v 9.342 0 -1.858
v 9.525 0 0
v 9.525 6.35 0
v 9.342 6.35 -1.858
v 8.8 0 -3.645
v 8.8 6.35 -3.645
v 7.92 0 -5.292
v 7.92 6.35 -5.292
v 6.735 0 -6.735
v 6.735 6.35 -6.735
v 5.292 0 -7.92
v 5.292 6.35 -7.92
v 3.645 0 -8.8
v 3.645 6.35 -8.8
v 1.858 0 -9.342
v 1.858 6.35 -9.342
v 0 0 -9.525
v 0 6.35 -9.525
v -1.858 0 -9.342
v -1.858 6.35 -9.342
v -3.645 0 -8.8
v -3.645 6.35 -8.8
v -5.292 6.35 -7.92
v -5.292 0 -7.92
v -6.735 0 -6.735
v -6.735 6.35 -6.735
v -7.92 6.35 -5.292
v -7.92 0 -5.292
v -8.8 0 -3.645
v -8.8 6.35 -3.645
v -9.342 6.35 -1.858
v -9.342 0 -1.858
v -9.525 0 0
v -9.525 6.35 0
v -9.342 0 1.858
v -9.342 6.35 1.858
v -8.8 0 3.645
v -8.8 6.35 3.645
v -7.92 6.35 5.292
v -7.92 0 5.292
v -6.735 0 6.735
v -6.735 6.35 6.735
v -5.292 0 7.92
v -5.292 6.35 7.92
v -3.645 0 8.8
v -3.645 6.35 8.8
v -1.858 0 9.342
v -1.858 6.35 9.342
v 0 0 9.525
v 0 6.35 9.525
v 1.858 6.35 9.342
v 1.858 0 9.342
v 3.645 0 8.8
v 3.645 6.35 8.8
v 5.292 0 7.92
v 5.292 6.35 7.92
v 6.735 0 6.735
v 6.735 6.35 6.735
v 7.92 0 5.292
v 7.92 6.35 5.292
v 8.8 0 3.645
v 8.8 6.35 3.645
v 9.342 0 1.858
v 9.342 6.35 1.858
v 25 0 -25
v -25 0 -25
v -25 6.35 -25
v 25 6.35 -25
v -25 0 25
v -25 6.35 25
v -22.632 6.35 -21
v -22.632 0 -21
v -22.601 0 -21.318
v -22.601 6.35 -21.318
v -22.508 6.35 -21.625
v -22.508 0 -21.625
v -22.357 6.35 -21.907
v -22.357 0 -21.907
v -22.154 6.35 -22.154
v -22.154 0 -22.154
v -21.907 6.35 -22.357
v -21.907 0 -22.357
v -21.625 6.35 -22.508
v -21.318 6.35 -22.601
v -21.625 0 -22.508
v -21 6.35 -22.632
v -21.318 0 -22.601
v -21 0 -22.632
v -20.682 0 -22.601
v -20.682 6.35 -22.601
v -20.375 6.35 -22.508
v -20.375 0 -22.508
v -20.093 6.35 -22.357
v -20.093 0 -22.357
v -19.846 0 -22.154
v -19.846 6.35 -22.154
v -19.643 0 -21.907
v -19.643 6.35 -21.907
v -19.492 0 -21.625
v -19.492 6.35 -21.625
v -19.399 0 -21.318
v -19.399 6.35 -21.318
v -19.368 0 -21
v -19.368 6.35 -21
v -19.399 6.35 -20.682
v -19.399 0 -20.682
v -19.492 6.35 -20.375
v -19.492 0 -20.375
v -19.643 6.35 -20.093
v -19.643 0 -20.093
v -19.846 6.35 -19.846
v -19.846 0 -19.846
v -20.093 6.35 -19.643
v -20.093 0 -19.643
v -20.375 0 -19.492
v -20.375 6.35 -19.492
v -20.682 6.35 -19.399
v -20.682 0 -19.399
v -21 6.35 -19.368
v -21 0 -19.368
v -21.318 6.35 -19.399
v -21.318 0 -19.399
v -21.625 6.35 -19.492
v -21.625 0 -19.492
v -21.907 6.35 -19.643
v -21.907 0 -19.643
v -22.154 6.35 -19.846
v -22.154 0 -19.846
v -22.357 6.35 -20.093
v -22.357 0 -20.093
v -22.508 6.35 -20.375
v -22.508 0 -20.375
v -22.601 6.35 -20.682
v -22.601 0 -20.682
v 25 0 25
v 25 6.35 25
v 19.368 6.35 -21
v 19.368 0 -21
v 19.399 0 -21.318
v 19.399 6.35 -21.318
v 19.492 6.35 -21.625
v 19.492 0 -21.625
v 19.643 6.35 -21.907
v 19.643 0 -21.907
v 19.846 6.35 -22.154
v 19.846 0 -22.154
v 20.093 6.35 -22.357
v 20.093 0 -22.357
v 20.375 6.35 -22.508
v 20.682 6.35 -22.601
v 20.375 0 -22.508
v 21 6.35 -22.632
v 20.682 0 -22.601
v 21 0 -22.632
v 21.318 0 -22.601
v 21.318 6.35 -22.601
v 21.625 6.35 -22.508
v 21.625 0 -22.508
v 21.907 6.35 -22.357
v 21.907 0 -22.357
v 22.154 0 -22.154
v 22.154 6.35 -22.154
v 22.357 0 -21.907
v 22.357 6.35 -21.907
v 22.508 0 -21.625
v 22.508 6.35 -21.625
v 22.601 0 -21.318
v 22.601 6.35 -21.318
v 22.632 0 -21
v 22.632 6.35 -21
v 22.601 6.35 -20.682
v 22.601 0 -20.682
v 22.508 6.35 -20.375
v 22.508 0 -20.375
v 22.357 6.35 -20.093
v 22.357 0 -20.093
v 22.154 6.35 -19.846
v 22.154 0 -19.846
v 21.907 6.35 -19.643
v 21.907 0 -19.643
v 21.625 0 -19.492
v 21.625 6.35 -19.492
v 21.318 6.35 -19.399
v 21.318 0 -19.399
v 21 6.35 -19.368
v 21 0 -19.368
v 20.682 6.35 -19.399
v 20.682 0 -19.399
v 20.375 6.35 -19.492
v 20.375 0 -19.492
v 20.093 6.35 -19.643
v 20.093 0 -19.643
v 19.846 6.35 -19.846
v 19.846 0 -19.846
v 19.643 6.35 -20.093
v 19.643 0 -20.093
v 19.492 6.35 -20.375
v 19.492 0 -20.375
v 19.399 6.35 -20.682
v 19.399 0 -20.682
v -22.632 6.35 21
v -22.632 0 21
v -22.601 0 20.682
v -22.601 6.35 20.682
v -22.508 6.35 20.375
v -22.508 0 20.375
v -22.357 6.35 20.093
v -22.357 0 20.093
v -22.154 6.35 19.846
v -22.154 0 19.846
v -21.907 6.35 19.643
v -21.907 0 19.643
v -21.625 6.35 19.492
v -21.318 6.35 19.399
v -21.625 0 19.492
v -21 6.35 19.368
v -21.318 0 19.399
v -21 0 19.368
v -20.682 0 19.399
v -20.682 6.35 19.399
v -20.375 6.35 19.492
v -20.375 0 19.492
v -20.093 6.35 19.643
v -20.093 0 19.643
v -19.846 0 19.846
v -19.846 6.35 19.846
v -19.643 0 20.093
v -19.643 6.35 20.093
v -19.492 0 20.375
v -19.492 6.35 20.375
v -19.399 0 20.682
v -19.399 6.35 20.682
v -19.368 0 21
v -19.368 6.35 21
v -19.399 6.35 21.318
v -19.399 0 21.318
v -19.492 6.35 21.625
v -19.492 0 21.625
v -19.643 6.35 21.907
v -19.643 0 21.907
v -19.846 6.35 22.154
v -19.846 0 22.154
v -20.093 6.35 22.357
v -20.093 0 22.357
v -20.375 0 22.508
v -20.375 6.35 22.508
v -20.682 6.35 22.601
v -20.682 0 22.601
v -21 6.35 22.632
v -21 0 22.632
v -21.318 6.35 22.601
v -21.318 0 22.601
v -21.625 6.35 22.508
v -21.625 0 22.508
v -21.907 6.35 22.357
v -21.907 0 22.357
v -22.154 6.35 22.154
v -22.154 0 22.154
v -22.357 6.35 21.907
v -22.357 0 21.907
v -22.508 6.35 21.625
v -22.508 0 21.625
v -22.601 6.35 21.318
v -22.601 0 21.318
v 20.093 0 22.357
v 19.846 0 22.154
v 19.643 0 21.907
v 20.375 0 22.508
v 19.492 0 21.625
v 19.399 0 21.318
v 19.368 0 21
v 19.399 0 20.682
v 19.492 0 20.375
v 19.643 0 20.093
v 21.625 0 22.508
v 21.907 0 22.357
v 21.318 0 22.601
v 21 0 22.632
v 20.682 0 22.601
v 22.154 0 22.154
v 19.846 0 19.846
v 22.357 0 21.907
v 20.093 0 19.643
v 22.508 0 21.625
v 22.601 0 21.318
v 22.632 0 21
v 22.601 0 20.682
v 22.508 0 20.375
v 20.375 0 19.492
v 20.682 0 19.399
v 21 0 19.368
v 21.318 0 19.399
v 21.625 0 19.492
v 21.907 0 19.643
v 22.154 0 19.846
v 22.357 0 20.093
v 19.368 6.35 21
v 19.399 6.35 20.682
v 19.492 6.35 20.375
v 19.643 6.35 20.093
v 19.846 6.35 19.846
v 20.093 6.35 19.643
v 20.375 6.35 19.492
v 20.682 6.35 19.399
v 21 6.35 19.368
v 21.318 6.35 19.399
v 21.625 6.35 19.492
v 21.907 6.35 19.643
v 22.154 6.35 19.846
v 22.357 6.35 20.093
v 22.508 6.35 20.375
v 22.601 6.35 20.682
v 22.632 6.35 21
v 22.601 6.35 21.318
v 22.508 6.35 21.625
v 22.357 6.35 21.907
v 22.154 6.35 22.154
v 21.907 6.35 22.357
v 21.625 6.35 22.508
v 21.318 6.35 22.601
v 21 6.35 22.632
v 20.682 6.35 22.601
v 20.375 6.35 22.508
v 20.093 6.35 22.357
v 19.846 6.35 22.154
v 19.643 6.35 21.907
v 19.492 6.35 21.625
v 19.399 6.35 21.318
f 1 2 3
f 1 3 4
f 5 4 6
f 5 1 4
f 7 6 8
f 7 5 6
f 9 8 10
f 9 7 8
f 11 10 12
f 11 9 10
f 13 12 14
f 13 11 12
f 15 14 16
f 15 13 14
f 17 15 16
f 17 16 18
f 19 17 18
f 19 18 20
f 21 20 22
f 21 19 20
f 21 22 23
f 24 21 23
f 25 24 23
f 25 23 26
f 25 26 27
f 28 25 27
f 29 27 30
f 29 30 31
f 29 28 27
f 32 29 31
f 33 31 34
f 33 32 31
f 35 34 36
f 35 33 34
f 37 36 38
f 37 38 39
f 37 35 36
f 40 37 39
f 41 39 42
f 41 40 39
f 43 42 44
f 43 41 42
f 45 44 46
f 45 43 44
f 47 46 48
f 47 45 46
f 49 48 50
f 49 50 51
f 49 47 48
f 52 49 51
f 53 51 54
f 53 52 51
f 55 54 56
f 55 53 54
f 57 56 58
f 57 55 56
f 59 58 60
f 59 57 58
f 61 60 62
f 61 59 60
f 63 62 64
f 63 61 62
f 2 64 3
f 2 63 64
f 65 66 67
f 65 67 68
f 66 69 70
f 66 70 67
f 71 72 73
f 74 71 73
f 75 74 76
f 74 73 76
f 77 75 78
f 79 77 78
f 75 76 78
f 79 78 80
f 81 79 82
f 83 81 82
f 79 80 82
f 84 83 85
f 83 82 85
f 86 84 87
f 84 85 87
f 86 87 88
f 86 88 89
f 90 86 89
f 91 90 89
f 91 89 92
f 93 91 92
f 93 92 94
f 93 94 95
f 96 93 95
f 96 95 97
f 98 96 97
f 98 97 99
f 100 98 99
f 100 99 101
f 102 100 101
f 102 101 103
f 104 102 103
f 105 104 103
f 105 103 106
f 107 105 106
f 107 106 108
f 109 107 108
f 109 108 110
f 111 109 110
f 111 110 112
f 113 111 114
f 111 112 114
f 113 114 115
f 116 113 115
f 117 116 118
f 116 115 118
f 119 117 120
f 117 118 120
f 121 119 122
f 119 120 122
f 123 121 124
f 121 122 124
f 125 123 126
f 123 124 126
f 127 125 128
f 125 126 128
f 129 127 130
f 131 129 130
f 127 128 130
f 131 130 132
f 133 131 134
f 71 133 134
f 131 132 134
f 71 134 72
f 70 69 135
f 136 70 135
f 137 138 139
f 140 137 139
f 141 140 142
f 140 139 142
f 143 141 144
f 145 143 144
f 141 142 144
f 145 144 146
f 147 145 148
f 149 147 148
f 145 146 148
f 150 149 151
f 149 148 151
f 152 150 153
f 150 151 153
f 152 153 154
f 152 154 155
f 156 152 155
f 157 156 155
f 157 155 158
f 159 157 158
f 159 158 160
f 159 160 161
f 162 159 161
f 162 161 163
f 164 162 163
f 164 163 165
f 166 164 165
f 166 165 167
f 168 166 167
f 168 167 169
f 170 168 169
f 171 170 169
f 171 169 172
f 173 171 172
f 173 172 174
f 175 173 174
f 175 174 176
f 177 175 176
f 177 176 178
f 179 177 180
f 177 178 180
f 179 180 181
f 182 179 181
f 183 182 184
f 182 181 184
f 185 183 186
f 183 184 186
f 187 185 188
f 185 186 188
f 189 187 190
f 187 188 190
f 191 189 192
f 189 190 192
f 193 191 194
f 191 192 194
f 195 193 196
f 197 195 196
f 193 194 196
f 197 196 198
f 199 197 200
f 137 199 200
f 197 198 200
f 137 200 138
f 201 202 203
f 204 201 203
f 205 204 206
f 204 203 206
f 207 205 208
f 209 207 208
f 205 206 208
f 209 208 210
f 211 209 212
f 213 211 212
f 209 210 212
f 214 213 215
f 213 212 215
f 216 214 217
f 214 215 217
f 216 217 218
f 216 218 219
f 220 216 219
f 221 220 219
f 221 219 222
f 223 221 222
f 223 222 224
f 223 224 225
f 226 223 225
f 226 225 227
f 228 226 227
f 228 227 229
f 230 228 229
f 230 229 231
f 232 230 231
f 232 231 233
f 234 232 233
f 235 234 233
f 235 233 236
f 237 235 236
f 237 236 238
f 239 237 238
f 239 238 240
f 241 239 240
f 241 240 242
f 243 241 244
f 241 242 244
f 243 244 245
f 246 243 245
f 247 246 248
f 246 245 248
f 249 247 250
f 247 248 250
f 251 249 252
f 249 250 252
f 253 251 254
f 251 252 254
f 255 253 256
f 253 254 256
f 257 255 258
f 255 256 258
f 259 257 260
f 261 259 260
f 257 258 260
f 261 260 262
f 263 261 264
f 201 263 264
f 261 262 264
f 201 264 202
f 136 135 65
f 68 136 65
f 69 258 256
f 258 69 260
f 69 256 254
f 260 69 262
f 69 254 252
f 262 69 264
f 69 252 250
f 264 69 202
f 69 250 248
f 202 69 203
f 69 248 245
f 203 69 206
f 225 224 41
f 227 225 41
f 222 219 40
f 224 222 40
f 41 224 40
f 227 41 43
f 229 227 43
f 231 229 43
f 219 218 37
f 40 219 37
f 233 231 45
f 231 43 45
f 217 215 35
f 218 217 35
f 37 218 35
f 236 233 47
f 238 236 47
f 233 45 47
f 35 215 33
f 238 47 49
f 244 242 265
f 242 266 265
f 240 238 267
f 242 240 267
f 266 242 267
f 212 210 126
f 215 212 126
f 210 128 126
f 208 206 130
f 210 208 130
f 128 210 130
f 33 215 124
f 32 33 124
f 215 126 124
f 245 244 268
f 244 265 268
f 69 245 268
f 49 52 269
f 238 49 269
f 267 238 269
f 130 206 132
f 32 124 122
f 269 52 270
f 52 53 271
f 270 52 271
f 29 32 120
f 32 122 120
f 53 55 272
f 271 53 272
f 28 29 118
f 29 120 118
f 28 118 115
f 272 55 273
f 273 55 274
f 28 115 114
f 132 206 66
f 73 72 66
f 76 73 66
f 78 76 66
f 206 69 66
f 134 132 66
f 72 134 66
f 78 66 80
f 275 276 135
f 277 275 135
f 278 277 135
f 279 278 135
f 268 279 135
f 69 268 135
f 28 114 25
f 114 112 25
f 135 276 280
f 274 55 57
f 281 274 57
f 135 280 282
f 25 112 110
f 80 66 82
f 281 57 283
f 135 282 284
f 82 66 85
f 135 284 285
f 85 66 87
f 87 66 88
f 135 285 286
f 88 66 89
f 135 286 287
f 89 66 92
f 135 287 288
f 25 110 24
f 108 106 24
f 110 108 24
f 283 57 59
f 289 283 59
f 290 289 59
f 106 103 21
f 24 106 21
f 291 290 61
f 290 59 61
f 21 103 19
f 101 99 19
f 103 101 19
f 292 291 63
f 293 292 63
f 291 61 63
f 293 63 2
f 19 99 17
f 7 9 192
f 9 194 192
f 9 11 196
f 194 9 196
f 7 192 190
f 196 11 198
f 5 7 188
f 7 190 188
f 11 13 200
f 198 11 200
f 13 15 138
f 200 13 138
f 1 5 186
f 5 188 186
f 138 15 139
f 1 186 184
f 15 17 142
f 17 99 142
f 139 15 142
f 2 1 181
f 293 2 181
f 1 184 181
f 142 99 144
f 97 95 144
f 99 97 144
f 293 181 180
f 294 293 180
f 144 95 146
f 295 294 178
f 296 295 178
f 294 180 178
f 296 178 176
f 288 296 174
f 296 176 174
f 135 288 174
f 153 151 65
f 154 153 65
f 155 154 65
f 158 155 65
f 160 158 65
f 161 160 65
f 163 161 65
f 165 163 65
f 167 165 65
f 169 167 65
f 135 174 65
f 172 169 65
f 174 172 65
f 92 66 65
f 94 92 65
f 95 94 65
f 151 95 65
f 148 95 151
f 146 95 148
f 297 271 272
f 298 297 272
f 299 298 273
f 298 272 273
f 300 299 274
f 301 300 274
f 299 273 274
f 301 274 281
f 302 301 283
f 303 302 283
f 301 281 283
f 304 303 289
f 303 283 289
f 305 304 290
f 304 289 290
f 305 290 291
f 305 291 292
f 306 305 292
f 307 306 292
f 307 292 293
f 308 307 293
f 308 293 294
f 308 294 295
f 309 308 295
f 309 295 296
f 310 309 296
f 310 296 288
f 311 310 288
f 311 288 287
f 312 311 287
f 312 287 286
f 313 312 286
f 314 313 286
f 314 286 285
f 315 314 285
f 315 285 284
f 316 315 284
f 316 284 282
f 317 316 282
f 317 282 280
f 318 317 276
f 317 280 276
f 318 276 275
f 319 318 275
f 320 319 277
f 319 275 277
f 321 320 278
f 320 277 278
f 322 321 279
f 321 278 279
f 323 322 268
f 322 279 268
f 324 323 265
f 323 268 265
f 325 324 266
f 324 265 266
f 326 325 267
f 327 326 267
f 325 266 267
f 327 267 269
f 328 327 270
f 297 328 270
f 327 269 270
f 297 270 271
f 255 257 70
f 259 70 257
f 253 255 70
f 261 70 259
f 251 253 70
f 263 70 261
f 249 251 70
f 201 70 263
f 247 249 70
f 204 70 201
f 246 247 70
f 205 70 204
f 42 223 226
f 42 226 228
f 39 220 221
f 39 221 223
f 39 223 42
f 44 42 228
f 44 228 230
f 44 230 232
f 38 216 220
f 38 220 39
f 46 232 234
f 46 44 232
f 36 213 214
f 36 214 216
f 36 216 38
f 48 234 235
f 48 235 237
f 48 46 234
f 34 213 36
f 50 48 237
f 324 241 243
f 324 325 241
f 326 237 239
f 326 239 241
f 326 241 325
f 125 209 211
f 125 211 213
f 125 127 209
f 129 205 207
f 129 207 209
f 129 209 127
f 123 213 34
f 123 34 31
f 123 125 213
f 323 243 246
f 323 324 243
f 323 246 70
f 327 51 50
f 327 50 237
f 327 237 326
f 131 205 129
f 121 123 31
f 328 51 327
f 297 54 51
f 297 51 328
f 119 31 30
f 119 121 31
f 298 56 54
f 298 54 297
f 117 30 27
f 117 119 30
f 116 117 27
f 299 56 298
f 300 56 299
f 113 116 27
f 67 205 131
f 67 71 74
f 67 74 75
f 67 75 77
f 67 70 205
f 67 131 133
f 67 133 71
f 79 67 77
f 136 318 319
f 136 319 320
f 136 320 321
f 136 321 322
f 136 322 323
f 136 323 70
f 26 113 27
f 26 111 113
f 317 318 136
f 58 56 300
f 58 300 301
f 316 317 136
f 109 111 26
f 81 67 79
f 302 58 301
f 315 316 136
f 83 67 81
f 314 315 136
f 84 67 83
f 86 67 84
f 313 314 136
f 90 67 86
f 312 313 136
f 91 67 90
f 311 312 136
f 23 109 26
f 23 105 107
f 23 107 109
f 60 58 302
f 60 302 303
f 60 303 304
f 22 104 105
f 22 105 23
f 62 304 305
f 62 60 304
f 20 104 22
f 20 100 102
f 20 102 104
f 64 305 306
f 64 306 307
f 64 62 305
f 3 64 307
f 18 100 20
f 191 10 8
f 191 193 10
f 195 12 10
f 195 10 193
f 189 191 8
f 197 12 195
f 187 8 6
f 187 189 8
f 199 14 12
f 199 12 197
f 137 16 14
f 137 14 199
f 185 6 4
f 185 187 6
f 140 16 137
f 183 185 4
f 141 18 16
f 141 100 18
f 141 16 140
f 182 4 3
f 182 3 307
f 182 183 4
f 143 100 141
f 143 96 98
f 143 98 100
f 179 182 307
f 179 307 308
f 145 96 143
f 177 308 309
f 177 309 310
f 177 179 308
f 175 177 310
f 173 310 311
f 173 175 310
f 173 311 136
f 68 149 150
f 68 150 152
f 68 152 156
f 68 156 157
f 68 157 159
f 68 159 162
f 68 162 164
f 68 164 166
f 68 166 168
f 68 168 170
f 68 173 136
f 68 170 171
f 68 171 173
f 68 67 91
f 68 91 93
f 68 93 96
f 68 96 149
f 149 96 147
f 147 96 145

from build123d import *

# Parameters (mm, degrees)
SKETCH2_W             = 50
SKETCH2_H             = 50
SKETCH2_R             = 9.525
BOSS_EXTRUDE1_DEPTH   = 6.35
F_4_CLEARANCE_HOLE1_D = 3.2639


with BuildPart() as part:
    # Sketch2 → Boss-Extrude1 (new body)
    with BuildSketch(Plane(origin=(0, 0, 0), x_dir=(1, 0, 0), z_dir=(0, 1, 0))):
        Rectangle(SKETCH2_W, SKETCH2_H)
        Circle(SKETCH2_R, mode=Mode.SUBTRACT)
    extrude(amount=BOSS_EXTRUDE1_DEPTH)

    # #4 Clearance Hole1 (through all)
    with Locations(Plane(origin=(0, 6.35, 0), x_dir=(1, 0, 0), z_dir=(0, 1, 0))):
        with Locations((-21, -21), (21, -21), (21, 21), (-21, 21)):
            Hole(F_4_CLEARANCE_HOLE1_D / 2)


solid = part.part
